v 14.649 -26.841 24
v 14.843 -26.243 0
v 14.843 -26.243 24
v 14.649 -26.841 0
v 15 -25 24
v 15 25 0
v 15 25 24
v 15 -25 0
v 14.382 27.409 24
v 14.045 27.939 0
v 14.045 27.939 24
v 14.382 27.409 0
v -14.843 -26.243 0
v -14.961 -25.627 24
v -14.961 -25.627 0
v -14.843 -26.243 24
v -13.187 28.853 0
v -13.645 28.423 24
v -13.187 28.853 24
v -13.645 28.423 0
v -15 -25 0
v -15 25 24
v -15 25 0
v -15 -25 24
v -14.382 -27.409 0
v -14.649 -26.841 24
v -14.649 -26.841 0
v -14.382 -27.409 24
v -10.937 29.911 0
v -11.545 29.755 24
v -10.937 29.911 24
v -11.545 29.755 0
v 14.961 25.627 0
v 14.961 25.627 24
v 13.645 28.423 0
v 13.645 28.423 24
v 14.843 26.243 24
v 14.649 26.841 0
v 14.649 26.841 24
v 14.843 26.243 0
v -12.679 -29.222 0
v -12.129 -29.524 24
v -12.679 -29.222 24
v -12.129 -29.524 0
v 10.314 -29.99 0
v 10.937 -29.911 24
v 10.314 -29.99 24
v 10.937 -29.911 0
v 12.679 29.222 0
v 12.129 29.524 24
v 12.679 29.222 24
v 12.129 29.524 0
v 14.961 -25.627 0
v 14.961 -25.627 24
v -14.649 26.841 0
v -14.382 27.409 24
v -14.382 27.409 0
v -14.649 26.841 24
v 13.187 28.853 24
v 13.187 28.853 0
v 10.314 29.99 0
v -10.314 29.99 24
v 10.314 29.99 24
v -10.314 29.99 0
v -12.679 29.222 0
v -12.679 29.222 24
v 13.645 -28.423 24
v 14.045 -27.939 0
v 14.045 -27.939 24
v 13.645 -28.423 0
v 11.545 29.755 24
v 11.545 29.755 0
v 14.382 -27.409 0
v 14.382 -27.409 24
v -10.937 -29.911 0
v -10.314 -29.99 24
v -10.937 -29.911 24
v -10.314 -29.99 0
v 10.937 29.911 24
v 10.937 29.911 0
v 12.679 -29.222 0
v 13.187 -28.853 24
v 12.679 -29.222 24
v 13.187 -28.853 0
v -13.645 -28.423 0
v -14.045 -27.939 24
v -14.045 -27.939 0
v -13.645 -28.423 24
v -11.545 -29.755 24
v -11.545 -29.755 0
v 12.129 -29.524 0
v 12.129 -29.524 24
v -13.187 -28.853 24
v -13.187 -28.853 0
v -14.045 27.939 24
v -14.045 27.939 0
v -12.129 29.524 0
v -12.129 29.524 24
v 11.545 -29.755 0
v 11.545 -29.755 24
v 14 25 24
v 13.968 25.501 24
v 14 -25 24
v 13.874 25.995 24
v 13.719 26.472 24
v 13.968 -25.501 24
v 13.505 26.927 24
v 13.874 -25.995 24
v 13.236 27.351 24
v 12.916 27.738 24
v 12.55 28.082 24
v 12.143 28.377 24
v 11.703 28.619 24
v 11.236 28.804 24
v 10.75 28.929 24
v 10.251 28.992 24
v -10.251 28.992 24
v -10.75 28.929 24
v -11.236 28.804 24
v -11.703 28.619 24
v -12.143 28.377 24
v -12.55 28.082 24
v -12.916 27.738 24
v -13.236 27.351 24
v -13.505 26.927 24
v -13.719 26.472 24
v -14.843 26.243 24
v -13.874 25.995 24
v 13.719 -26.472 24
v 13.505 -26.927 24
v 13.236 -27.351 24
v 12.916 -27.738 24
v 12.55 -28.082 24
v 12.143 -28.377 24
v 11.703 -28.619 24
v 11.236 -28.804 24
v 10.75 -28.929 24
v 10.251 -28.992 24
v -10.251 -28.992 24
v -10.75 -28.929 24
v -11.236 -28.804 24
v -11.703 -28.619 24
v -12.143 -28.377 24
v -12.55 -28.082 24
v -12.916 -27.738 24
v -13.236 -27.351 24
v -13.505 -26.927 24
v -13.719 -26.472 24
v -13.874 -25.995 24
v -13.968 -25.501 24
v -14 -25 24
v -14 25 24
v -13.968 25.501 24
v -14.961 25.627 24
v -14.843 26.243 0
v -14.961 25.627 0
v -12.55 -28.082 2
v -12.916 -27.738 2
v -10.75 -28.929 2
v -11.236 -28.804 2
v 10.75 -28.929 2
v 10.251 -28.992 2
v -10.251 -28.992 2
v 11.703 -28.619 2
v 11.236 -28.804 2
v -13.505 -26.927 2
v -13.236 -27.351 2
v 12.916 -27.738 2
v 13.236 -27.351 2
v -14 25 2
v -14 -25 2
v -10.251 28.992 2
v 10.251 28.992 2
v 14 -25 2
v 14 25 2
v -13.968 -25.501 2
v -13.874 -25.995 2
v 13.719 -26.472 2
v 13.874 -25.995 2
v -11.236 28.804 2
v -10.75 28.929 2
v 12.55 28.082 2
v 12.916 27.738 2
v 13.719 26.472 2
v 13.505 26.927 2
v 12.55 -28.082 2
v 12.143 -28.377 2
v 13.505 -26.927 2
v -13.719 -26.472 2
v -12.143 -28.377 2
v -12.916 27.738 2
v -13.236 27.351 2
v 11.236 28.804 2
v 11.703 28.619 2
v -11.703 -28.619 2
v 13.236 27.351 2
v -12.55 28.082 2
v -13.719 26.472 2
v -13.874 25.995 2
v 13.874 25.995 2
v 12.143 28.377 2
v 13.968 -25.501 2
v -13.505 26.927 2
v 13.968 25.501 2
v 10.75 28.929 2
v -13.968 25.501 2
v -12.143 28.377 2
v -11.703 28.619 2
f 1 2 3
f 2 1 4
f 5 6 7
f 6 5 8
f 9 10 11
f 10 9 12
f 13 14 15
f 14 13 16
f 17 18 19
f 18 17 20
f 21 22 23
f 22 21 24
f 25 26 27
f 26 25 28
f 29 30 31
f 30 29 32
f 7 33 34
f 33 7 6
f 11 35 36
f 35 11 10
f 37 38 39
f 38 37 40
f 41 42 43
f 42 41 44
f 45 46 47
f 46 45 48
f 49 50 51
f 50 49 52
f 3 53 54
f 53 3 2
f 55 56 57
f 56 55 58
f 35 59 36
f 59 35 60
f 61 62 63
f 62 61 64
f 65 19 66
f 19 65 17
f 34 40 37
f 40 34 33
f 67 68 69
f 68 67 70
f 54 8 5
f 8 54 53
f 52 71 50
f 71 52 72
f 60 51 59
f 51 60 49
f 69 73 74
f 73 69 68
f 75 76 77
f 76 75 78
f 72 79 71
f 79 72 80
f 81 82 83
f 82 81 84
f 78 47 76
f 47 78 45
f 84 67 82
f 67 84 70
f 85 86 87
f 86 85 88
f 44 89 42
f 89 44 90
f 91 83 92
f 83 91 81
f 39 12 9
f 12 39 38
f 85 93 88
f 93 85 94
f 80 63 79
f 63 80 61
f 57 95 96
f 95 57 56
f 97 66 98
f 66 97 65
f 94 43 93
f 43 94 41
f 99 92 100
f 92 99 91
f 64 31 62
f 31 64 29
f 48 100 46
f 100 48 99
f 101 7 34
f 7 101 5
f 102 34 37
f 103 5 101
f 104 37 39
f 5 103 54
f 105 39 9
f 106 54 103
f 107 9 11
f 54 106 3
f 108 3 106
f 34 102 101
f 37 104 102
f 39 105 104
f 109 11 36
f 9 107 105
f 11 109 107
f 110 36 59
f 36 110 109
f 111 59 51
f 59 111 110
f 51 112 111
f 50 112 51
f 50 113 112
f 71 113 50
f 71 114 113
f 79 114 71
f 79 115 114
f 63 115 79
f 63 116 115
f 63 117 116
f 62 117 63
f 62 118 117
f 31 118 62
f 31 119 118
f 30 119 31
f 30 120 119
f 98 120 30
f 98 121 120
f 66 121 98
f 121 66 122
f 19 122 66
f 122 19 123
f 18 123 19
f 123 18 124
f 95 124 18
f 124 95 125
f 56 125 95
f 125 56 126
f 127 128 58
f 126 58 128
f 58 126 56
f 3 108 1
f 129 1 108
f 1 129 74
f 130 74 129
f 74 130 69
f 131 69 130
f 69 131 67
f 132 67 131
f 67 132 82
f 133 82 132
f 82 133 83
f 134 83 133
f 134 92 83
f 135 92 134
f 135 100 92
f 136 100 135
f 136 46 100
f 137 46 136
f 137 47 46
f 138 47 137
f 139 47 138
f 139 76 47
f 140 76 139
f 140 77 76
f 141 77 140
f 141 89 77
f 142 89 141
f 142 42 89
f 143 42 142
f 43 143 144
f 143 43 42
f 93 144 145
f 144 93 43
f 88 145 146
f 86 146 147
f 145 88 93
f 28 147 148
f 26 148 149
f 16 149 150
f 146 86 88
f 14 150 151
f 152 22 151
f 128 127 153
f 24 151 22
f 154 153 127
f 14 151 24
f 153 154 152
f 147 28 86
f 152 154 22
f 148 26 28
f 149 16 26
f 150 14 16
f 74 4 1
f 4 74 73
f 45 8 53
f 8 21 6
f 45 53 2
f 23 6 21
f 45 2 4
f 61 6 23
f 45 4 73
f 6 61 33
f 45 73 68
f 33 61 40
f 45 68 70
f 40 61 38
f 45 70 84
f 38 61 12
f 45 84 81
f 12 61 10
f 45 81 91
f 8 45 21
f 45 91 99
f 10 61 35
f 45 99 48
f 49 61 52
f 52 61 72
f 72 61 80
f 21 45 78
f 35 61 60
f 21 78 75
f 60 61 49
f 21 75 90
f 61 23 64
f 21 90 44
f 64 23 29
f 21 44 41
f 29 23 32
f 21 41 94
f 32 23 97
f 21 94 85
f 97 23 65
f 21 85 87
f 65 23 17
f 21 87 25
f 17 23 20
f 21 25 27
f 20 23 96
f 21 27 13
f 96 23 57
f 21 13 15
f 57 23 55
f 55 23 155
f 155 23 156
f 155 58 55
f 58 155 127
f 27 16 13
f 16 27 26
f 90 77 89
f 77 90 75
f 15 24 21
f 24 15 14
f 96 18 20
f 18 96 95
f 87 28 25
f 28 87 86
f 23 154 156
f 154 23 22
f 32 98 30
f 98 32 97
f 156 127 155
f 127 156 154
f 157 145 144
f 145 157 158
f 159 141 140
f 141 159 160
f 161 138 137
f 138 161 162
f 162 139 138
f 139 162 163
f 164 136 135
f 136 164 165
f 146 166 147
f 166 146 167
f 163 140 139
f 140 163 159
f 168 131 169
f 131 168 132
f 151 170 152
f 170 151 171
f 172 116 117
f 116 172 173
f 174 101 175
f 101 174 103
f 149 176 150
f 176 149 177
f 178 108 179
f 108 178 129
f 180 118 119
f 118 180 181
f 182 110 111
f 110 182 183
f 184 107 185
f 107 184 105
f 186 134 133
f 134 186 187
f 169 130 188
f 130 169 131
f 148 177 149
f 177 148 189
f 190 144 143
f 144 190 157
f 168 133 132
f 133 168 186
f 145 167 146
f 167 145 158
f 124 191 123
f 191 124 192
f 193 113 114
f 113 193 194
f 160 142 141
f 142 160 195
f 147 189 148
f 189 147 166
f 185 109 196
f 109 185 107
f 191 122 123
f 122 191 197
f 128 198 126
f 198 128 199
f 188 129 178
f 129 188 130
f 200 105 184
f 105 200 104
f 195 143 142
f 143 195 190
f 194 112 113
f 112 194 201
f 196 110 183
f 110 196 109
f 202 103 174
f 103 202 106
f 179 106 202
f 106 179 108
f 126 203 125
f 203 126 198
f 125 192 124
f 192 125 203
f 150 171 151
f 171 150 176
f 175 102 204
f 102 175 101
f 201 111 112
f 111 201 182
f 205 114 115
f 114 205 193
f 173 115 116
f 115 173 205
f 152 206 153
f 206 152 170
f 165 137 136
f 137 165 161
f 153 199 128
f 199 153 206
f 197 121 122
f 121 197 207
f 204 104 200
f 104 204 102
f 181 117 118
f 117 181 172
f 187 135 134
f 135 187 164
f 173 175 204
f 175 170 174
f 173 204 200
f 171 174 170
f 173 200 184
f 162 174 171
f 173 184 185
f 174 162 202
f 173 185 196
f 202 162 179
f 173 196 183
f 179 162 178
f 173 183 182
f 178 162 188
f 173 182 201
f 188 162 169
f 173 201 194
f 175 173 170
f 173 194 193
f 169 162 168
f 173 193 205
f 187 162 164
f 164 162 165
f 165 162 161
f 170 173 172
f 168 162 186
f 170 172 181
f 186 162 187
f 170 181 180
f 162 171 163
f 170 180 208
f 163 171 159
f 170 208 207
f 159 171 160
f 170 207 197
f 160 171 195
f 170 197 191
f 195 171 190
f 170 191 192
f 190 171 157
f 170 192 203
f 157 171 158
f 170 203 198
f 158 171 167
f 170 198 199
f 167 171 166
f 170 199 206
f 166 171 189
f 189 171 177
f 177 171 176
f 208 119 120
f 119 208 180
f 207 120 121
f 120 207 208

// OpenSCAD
$fn = 50;


difference() {
	union() {
		hull() {
			translate(v = [-10.0000000000, 25.0000000000, 0]) {
				cylinder(h = 24, r = 5);
			}
			translate(v = [10.0000000000, 25.0000000000, 0]) {
				cylinder(h = 24, r = 5);
			}
			translate(v = [-10.0000000000, -25.0000000000, 0]) {
				cylinder(h = 24, r = 5);
			}
			translate(v = [10.0000000000, -25.0000000000, 0]) {
				cylinder(h = 24, r = 5);
			}
		}
	}
	union() {
		translate(v = [0, 0, 2]) {
			hull() {
				translate(v = [-10.0000000000, 25.0000000000, 0]) {
					cylinder(h = 22, r = 4);
				}
				translate(v = [10.0000000000, 25.0000000000, 0]) {
					cylinder(h = 22, r = 4);
				}
				translate(v = [-10.0000000000, -25.0000000000, 0]) {
					cylinder(h = 22, r = 4);
				}
				translate(v = [10.0000000000, -25.0000000000, 0]) {
					cylinder(h = 22, r = 4);
				}
			}
		}
	}
}
